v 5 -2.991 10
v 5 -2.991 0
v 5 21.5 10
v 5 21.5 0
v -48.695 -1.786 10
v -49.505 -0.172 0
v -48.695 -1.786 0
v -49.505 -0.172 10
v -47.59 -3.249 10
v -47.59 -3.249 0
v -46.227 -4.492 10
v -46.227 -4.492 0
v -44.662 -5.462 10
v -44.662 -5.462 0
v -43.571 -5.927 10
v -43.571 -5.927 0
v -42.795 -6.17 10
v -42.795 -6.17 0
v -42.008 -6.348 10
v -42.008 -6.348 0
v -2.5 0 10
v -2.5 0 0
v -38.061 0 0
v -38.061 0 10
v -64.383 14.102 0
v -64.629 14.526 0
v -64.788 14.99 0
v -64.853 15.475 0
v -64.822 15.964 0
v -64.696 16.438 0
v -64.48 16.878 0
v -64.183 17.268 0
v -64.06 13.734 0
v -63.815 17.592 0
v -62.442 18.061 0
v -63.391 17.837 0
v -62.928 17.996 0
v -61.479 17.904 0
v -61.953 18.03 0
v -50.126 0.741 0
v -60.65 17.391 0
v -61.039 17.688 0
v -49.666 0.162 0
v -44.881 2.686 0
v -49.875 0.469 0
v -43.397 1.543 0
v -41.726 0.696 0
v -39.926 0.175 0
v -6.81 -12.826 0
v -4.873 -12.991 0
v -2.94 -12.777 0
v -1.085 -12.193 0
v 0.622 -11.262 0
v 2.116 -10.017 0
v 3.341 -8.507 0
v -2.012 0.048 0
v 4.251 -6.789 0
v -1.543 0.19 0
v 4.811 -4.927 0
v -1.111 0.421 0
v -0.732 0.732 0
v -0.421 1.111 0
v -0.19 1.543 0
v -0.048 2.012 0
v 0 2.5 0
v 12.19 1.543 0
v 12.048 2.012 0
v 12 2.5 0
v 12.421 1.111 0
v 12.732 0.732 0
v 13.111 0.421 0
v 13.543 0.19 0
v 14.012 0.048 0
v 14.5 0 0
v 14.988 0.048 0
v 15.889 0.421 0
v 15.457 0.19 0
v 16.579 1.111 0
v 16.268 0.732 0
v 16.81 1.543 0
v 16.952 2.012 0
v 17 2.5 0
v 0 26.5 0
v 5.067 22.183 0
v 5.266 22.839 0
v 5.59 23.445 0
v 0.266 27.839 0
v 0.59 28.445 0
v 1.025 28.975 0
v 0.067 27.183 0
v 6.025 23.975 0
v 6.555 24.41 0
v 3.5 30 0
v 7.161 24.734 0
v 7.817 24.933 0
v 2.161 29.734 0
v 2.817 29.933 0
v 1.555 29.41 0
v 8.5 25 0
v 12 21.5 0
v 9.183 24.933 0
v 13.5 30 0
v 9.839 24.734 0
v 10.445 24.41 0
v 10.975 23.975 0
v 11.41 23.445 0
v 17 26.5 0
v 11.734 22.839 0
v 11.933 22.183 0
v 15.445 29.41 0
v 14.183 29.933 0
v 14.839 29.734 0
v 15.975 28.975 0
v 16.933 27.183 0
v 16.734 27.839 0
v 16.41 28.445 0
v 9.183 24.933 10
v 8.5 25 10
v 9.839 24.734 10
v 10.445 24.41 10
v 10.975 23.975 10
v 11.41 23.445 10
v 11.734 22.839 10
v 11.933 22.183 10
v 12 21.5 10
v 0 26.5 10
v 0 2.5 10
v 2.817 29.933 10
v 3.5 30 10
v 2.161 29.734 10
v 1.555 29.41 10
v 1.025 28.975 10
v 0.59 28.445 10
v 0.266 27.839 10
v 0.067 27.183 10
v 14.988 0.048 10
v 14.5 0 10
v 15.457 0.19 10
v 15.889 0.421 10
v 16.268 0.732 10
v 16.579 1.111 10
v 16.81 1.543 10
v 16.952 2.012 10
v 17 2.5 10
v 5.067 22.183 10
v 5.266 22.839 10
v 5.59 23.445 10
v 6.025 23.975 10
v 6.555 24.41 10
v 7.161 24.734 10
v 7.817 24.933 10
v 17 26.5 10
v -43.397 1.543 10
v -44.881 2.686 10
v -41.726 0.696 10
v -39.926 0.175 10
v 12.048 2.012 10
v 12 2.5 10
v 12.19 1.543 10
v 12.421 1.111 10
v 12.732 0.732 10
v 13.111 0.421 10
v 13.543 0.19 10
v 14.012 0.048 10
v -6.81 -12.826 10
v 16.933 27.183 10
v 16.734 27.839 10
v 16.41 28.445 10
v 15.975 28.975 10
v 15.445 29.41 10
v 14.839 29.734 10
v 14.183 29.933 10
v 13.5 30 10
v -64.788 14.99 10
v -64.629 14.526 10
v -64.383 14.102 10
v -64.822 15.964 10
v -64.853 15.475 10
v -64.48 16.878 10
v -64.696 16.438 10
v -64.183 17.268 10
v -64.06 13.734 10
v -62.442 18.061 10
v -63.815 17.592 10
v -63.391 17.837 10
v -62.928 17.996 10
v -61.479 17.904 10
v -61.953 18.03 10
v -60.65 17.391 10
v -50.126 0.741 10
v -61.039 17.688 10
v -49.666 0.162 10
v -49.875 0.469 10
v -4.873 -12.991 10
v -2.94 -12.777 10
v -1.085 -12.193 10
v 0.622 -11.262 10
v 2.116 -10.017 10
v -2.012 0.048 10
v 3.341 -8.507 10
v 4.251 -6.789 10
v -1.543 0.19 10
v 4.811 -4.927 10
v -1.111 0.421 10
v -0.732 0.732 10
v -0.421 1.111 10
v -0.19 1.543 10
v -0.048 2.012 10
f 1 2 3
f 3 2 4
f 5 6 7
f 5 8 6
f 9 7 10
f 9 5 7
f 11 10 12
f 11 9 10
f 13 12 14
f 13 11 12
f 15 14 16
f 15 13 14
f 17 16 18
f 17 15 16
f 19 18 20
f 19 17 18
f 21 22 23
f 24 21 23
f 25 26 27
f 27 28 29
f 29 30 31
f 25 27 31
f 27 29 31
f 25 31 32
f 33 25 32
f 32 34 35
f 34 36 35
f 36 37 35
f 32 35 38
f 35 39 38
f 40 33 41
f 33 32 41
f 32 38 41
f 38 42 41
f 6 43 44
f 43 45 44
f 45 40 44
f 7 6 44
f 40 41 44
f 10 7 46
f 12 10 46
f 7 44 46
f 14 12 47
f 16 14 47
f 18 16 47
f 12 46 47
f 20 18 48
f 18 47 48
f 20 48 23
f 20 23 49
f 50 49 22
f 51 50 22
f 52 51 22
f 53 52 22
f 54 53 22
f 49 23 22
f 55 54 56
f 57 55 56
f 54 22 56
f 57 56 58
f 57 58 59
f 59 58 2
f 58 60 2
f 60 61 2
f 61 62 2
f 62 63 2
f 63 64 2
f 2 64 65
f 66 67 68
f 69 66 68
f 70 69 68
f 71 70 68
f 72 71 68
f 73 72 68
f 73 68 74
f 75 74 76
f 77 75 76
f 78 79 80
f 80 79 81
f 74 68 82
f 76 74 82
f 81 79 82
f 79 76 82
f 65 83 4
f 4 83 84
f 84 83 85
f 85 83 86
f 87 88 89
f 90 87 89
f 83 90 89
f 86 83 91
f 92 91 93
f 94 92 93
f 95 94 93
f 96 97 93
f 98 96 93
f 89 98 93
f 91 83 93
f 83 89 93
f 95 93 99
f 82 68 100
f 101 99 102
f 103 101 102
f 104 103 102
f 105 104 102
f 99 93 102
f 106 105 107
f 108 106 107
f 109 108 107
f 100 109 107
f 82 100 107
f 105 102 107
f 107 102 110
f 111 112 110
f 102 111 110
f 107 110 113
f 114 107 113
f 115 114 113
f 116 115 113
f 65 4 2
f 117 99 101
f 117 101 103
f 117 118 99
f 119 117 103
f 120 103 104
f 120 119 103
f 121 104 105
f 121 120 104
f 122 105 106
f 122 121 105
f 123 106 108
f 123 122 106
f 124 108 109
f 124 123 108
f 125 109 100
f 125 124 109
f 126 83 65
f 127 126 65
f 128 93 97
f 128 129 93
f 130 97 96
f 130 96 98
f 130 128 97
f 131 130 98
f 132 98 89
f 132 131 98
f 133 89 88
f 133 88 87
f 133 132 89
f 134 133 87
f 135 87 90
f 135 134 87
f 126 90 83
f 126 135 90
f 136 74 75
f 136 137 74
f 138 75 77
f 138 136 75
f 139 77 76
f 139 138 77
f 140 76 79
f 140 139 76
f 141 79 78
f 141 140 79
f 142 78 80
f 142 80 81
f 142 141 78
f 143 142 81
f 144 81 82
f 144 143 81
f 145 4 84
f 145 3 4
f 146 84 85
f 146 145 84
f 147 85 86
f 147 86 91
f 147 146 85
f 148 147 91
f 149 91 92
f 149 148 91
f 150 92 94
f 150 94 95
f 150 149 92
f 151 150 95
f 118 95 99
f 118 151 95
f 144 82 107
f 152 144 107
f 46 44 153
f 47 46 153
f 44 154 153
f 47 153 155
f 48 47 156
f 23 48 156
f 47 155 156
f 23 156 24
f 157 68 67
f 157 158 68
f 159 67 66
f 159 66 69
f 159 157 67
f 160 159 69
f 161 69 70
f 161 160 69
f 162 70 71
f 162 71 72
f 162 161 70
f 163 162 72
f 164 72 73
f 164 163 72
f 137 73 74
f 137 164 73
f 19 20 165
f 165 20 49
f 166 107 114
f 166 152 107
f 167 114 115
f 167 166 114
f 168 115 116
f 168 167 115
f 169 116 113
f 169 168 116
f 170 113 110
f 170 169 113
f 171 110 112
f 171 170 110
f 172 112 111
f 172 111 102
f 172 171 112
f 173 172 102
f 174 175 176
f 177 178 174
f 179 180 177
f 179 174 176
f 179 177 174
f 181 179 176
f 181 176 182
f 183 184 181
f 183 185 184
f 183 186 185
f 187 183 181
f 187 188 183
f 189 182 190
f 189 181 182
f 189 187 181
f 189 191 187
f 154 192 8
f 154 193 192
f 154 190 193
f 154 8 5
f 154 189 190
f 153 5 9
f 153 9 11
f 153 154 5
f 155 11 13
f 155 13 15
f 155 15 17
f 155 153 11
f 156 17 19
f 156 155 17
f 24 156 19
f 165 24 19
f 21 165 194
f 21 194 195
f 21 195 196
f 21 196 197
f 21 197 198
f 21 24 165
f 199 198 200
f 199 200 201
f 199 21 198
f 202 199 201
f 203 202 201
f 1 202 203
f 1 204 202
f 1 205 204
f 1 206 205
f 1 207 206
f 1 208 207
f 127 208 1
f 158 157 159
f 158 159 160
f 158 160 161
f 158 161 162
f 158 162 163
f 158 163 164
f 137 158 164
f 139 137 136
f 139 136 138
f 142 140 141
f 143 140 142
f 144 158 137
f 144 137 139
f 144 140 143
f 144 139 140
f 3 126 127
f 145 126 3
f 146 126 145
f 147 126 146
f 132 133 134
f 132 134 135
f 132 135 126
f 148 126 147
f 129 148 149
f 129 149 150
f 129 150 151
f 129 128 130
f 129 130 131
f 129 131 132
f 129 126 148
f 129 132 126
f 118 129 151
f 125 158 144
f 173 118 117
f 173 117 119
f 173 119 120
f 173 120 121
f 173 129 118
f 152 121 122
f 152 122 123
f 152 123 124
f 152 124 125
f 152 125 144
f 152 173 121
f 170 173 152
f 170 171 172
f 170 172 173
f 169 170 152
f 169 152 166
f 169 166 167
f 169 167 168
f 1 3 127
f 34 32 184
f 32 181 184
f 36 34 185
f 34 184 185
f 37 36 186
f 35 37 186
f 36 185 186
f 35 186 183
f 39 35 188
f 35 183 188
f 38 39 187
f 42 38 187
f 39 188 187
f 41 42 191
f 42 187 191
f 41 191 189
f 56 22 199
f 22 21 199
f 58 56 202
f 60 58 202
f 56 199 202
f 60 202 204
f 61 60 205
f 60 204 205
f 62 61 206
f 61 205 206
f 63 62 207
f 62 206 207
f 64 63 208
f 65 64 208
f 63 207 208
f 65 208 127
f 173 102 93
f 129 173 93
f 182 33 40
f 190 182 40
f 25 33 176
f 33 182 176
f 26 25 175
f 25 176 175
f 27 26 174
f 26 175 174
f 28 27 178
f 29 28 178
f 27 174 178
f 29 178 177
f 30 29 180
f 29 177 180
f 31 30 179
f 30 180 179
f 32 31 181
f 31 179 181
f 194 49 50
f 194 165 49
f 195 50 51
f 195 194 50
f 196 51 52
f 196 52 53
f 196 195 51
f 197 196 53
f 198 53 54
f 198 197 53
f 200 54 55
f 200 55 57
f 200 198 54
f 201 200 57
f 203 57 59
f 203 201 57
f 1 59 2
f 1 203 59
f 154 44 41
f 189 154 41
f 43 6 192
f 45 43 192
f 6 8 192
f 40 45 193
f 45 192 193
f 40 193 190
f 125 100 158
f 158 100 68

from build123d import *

# Parameters (mm, degrees)
F1_DEPTH = 10
F2_R     = 3.49999
F3_R     = 2.49999
F4_R     = 10


# Not quite as in the source:
# - a fillet or chamfer is up to 0.001 mm smaller than in the source, because OpenCascade refuses the exact size


with BuildPart() as f1:
    # F0 (on Top) → F1 (new body)
    with BuildSketch(Plane.XY):
        Polygon((5, -15), (5, 0), (5, 25), (12, 25), (12, 0), (17, 0), (17, 30), (0, 30), (0, 0), (-42, 0), (-49.3313959282, 0), (-49.3313959282, -5), align=None)
        Polygon((-65.8878954456, 15.4391855737), (-49.3313959282, 0), (-42, 0), (-62.4779036453, 19.0959540817), align=None)
    extrude(amount=F1_DEPTH)

    # F2 (radius 3.5 in the source; OpenCascade refuses exactly that, so slightly less here)
    f2_edges = [f1.edges().sort_by_distance(p)[0] for p in [
        (5, 25, 5),
        (12, 25, 5),
        (0, 30, 5),
        (17, 30, 5),
    ]]
    fillet(f2_edges, radius=F2_R)

    # F3 (radius 2.5 in the source; OpenCascade refuses exactly that, so slightly less here)
    f3_edges = [f1.edges().sort_by_distance(p)[0] for p in [
        (0, 0, 5),
        (17, 0, 5),
        (12, 0, 5),
        (-49.331396, 0, 5),
        (-62.477904, 19.095954, 5),
        (-65.887895, 15.439186, 5),
    ]]
    fillet(f3_edges, radius=F3_R)

    # F4
    f4_edges = [f1.edges().sort_by_distance(p)[0] for p in [
        (-2.49999, 0, 5),
        (5, -15, 5),
        (-49.331396, -5, 5),
        (-42, 0, 5),
    ]]
    fillet(f4_edges, radius=F4_R)


solid = f1.part
